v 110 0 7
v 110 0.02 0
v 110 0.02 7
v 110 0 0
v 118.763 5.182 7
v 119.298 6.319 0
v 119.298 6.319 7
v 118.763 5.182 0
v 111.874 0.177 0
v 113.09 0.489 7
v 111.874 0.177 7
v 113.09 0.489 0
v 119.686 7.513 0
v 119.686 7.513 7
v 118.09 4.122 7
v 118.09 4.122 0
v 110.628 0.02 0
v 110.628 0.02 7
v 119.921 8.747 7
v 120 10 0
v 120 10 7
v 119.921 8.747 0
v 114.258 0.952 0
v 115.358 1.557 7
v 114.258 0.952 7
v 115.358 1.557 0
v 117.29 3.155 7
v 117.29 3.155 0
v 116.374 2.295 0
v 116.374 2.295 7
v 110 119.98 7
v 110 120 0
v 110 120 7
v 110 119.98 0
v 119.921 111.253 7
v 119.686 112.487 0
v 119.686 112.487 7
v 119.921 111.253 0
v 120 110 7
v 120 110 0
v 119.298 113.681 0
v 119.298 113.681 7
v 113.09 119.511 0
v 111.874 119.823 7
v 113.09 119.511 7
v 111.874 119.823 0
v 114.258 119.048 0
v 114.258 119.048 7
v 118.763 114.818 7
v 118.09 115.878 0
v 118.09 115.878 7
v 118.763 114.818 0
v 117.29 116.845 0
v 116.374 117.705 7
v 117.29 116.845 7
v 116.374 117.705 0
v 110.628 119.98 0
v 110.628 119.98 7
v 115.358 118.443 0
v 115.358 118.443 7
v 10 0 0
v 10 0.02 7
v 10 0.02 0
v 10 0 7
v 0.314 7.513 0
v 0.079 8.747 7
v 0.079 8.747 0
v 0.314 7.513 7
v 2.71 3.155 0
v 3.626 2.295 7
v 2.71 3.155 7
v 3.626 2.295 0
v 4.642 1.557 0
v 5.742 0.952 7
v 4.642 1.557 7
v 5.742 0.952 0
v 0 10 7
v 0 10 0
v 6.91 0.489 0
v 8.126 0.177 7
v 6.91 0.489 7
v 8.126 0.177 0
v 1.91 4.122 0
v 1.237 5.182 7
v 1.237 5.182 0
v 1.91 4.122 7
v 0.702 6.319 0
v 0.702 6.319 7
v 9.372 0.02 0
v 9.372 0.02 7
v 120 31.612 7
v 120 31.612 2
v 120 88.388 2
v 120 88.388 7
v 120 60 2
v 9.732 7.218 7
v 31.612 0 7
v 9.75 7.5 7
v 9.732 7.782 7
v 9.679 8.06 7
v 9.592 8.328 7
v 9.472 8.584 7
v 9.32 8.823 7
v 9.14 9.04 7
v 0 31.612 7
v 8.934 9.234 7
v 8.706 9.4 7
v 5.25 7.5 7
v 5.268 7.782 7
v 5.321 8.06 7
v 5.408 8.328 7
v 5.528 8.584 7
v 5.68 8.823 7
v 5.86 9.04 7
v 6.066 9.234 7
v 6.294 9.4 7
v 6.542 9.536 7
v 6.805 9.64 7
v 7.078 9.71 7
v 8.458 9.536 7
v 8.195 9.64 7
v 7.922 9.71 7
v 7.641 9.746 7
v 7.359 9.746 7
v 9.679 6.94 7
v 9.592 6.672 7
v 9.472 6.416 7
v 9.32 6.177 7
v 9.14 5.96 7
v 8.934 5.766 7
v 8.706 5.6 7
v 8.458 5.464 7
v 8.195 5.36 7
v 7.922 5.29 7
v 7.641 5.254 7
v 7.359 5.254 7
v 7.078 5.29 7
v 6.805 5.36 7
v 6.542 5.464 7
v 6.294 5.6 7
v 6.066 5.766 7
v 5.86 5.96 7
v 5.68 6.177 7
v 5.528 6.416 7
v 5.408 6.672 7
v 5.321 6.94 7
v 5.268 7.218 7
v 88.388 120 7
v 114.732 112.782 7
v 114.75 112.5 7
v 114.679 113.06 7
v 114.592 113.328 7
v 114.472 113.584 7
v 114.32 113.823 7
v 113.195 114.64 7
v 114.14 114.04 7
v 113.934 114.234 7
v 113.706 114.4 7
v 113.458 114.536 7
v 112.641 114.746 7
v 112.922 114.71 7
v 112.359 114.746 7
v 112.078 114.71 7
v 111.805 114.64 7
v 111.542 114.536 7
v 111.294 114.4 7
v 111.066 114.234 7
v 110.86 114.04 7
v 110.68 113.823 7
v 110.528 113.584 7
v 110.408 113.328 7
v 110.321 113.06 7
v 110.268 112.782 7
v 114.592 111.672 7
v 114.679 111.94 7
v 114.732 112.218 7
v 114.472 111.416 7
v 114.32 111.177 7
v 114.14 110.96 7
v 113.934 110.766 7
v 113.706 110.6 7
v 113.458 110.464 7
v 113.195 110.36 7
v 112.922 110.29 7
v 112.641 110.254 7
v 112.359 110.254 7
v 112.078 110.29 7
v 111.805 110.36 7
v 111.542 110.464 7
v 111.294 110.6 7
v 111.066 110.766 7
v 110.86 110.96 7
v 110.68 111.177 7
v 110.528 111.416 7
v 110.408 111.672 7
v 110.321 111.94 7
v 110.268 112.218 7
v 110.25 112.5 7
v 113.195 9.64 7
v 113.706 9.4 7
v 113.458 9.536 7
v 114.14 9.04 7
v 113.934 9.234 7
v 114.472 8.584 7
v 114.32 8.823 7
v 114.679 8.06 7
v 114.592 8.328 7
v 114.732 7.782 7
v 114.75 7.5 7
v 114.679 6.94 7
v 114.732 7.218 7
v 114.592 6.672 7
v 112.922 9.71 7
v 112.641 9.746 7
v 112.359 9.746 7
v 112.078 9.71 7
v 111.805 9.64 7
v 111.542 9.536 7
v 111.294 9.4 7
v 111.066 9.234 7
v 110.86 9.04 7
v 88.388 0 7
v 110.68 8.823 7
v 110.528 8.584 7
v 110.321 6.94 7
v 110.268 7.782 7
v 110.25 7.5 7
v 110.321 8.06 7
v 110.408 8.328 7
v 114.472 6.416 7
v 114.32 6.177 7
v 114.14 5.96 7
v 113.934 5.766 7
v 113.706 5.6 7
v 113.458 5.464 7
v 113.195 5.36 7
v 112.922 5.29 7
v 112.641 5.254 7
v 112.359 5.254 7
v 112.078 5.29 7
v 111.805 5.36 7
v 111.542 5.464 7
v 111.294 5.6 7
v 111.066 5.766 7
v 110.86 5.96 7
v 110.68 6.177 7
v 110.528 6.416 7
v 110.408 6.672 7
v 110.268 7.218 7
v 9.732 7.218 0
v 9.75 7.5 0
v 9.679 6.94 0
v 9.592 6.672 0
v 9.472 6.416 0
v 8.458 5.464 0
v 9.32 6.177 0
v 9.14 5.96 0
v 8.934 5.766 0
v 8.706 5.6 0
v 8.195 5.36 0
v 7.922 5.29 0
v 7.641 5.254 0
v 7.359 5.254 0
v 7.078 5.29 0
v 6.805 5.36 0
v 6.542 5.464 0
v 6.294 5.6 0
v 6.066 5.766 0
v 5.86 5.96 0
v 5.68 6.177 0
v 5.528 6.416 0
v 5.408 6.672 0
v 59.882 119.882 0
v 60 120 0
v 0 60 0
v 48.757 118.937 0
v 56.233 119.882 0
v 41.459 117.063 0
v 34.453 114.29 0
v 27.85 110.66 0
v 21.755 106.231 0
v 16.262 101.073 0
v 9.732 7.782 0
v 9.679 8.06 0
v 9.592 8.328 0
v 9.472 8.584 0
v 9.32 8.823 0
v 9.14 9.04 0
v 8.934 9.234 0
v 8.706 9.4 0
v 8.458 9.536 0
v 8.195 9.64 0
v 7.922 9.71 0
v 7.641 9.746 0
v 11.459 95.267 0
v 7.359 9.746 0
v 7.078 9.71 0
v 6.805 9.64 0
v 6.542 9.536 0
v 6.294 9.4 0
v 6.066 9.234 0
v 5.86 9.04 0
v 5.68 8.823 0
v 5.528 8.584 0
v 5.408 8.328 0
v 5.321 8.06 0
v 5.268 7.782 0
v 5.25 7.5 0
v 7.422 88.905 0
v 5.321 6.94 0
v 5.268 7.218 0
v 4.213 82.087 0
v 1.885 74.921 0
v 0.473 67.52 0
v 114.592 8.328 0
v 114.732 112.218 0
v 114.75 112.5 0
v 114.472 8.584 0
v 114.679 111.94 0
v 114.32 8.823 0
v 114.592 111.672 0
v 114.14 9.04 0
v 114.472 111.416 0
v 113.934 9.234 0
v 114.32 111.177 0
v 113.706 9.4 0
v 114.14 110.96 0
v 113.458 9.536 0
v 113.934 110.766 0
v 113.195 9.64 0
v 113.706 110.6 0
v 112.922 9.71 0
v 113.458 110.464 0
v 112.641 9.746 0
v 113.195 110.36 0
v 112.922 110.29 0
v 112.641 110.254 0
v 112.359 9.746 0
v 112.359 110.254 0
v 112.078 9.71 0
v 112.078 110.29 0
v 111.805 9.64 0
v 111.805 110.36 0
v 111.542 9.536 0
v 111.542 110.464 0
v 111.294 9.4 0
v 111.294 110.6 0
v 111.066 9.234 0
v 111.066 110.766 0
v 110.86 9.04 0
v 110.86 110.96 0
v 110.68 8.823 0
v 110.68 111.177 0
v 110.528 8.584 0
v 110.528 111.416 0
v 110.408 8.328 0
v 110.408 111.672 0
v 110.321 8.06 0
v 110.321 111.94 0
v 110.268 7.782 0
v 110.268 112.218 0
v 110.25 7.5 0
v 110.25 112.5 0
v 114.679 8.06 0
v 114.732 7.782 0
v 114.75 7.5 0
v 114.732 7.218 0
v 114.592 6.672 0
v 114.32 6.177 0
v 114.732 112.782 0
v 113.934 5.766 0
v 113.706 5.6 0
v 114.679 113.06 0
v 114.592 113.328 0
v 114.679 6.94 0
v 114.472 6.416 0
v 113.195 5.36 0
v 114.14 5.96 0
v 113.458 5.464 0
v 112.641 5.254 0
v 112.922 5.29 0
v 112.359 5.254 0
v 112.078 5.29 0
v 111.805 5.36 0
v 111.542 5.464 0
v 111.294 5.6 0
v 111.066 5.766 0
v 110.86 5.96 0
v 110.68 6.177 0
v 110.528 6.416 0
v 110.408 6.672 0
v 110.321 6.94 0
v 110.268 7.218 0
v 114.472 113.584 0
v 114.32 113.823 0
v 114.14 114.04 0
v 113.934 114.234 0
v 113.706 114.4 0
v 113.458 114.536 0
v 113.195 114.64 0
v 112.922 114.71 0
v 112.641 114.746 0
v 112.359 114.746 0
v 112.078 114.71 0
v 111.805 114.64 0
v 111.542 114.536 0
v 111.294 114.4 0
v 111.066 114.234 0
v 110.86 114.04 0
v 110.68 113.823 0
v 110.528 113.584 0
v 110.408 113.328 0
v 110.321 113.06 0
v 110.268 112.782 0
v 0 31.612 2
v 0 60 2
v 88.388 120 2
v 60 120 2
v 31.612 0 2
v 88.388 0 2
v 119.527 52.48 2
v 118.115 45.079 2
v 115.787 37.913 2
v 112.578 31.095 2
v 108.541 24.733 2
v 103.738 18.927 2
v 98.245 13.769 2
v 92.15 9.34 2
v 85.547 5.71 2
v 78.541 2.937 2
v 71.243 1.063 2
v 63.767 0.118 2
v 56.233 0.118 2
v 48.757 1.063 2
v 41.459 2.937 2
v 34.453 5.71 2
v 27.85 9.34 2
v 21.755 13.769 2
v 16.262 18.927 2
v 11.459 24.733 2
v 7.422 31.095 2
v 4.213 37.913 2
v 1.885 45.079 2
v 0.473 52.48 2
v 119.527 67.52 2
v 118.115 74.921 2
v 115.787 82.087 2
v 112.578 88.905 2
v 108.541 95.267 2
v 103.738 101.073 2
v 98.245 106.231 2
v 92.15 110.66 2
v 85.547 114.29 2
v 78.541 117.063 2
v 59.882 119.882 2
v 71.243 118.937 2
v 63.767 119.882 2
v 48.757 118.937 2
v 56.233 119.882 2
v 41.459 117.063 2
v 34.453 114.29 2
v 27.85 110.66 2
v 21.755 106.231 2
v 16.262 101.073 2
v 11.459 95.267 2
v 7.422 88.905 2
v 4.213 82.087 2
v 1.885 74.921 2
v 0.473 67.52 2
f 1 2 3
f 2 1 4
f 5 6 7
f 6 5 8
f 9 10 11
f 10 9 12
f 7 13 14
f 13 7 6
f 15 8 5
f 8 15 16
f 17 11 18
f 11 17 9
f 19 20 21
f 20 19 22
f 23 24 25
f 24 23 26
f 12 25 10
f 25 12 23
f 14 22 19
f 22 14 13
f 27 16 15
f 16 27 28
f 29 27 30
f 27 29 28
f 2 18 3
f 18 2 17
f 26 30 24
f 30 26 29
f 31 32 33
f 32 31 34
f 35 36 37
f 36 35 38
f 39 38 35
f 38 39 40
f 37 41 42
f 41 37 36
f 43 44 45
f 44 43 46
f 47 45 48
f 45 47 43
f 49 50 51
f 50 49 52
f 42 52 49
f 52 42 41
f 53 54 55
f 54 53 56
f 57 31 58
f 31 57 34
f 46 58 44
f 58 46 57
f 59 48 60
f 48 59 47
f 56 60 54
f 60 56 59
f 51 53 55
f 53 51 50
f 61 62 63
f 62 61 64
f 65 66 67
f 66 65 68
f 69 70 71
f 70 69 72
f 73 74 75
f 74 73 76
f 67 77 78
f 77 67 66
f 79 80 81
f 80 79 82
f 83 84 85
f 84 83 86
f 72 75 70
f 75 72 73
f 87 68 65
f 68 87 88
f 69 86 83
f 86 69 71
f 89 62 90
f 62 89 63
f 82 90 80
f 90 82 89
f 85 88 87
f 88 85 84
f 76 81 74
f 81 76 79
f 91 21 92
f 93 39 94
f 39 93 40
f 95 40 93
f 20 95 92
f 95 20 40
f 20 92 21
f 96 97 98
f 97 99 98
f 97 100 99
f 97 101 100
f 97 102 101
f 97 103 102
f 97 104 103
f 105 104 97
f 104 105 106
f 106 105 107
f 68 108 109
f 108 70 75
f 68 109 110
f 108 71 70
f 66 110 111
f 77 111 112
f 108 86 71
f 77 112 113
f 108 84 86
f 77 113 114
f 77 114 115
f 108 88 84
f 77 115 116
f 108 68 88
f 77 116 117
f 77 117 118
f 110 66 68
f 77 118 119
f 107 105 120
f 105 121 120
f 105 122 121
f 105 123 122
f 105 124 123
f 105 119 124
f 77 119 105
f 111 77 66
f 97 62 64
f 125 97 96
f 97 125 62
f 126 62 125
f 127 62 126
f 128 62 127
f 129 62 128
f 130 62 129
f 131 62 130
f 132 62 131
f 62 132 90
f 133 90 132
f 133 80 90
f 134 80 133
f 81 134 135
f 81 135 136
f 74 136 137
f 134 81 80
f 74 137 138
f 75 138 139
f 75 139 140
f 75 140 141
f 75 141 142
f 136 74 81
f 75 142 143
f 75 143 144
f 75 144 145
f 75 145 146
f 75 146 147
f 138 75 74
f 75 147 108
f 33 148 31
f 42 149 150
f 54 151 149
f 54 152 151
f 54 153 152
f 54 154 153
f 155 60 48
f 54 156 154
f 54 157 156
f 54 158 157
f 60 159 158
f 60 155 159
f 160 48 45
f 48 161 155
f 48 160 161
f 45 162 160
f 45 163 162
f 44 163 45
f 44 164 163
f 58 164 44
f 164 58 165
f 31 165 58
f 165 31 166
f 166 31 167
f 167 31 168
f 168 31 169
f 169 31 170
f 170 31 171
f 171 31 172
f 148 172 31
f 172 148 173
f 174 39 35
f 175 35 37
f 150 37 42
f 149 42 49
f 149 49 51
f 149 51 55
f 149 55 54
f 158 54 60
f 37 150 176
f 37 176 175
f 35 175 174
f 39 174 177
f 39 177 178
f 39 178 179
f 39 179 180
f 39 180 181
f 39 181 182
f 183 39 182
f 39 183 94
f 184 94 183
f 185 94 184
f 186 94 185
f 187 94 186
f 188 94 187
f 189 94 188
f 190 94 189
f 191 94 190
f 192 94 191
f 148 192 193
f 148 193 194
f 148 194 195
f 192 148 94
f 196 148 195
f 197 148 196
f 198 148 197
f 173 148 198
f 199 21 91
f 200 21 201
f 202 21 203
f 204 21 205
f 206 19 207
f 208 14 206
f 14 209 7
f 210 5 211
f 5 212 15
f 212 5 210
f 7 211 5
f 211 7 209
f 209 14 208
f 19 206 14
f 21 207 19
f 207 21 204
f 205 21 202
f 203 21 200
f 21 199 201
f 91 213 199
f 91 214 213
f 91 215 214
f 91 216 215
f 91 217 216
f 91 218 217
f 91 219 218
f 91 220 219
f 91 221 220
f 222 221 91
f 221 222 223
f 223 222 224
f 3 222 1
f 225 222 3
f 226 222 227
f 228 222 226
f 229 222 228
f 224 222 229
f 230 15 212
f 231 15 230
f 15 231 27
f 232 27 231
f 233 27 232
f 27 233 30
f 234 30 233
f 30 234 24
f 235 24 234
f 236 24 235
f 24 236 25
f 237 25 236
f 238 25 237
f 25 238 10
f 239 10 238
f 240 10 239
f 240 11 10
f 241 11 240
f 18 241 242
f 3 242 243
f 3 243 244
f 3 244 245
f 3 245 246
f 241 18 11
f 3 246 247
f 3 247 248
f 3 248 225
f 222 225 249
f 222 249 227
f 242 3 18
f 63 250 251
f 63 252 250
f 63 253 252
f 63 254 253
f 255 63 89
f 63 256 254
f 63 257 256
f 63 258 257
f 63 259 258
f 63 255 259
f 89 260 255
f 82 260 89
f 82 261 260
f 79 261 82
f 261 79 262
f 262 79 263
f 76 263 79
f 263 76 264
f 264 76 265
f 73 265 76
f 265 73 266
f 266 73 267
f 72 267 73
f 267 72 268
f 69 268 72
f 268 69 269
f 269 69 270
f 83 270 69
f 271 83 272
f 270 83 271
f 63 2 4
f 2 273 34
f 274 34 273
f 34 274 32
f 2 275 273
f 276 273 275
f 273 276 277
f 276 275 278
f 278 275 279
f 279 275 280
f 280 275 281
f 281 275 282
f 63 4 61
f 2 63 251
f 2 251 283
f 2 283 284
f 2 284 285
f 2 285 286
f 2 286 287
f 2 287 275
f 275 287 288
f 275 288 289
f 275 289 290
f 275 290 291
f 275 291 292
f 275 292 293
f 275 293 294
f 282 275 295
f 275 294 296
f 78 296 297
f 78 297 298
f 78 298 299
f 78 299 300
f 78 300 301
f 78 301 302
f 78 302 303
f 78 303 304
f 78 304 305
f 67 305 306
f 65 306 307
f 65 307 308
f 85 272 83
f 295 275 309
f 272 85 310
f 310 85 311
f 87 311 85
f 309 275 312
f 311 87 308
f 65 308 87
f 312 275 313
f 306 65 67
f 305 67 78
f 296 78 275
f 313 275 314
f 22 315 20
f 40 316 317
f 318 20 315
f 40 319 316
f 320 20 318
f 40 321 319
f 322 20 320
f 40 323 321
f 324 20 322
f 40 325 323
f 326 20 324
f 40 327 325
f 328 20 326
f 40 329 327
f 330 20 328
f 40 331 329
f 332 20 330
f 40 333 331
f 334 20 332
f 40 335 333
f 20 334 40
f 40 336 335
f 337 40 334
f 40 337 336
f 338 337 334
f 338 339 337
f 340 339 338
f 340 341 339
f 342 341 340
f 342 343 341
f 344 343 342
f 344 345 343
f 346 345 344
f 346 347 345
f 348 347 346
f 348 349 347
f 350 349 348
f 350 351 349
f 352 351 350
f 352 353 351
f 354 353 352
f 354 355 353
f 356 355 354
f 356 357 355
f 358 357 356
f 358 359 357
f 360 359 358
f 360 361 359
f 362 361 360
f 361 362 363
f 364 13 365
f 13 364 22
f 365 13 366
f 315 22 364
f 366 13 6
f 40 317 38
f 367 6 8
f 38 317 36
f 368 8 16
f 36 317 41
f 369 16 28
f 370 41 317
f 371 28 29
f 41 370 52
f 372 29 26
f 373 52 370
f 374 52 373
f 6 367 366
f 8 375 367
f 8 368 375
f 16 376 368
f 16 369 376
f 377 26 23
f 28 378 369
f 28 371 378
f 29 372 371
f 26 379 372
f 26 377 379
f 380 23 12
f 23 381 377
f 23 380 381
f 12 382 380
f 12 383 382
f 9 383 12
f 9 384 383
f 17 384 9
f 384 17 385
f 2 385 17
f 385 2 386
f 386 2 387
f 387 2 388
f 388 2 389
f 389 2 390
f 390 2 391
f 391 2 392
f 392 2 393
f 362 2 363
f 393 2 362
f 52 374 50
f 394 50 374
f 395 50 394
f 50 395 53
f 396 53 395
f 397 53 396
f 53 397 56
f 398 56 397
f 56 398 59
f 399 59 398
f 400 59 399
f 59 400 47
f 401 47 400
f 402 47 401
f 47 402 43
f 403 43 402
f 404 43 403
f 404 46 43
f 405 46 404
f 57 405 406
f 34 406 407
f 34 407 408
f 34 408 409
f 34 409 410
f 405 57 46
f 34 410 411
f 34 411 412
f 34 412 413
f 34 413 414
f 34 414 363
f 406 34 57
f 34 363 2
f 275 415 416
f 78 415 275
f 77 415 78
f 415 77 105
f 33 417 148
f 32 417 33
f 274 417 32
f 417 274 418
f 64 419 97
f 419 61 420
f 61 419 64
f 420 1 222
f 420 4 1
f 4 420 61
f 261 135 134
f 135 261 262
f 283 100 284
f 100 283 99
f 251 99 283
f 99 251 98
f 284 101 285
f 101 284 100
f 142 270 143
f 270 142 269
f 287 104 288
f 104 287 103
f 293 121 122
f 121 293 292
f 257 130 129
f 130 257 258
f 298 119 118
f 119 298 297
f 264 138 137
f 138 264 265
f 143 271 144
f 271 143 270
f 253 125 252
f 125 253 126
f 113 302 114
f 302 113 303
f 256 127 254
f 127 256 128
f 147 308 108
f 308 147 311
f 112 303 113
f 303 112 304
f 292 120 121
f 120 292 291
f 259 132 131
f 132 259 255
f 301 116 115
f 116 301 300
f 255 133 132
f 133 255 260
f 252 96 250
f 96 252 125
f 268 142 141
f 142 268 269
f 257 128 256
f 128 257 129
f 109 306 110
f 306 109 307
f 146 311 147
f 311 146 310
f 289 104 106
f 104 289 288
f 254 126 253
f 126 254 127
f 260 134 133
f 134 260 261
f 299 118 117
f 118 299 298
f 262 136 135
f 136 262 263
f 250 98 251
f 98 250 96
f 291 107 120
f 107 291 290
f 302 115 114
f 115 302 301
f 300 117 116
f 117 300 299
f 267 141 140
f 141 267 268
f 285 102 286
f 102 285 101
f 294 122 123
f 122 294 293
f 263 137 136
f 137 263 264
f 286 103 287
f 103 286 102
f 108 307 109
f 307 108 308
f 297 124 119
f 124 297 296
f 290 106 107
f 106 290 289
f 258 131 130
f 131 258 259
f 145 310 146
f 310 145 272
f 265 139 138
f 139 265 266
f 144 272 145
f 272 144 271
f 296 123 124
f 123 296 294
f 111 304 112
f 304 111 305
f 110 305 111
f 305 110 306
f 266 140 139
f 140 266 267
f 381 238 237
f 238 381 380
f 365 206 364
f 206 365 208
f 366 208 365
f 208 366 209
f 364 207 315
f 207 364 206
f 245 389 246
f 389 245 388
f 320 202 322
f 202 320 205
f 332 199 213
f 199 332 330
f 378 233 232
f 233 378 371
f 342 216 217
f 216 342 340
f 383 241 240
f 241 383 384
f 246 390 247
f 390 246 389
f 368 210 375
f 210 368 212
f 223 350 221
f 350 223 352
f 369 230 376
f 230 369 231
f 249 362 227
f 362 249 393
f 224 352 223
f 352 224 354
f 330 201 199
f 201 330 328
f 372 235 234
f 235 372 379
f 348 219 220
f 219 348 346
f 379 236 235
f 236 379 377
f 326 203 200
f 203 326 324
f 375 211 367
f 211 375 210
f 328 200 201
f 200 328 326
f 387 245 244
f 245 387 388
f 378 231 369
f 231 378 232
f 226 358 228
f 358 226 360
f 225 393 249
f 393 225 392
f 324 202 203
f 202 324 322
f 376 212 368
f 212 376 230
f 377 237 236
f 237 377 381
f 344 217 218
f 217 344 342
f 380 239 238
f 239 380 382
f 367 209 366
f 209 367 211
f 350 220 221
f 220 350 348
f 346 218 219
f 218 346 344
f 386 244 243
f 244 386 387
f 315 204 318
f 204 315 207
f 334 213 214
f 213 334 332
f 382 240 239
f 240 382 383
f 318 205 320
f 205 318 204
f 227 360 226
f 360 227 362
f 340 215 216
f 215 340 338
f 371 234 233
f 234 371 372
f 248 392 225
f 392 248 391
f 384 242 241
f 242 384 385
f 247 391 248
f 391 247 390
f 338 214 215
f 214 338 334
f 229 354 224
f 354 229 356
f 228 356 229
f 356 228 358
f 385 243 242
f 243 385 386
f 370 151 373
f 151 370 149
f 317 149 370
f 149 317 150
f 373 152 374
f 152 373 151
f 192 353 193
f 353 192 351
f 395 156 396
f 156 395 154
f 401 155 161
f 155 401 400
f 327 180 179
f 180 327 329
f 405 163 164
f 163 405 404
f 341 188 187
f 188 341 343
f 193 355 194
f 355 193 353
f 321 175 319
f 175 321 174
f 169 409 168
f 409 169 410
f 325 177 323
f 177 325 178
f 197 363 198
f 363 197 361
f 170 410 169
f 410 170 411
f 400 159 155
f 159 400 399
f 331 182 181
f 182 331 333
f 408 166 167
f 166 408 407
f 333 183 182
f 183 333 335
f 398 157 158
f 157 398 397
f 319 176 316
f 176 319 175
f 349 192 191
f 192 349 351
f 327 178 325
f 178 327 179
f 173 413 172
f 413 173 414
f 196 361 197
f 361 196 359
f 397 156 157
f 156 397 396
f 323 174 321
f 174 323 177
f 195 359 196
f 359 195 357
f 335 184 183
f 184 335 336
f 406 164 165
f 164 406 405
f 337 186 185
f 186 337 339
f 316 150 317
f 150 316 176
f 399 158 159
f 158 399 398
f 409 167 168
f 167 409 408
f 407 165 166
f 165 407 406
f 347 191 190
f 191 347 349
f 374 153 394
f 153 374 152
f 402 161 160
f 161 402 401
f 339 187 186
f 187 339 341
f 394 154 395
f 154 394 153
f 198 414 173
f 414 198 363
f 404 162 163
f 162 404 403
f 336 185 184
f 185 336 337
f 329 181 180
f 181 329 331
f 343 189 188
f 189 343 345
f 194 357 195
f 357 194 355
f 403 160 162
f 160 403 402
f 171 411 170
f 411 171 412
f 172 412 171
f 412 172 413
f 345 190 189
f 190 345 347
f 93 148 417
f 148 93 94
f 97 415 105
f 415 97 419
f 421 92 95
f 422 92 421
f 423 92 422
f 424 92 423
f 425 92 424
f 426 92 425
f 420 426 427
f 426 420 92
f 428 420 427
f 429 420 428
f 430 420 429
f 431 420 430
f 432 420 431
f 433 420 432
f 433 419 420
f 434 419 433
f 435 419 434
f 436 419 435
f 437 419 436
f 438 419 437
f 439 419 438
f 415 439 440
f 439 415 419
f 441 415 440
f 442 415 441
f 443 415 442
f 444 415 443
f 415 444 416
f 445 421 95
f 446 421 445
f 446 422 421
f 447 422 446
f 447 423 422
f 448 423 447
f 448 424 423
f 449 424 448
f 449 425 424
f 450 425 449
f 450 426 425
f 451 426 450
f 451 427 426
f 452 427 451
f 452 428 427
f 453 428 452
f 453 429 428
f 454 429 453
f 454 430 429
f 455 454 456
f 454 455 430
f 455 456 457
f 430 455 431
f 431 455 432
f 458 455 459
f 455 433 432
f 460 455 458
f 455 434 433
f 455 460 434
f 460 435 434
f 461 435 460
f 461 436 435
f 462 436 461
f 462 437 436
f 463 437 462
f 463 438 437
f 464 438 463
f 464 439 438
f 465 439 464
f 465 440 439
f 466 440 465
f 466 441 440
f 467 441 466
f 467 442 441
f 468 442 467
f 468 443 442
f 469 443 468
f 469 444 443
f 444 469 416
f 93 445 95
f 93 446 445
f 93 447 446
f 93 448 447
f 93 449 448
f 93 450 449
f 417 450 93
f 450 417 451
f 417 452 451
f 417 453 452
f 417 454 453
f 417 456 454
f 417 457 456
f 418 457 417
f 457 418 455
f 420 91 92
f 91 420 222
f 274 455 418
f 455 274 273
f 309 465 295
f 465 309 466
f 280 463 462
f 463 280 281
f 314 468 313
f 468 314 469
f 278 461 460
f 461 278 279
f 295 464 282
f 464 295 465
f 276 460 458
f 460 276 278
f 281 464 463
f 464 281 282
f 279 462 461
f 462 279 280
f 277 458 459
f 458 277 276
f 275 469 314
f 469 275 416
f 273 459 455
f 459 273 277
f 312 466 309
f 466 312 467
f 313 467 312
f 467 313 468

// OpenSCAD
//Fan Size
size = 120;
//Distance between fan mounting holes
hole_spacing = 105;
//Rounded corner radius
corner_radius = 10;
//Thickness of outside plate
thickness = 2;
//Should match the thickness of the filter
stand_off_length = 5;
//Mounting hole size
screw_size = 4.5;


$filtersize=size+5;
$c = sqrt($filtersize*$filtersize*2);
$standoffwidth = screw_size+6;
$screwoffset = (size-hole_spacing)/2;
difference(){
    union(){
        cube([size,size,thickness+stand_off_length]);
    }
    translate([$screwoffset,$screwoffset,-1])
    cylinder(thickness+stand_off_length+2,screw_size/2,screw_size/2,$fn=50);
    translate([$screwoffset+hole_spacing,$screwoffset,-1])
    cylinder(thickness+stand_off_length+2,screw_size/2,screw_size/2,$fn=50);
    translate([$screwoffset,$screwoffset+hole_spacing,-1])
    cylinder(thickness+stand_off_length+2,screw_size/2,screw_size/2,$fn=50);
    translate([$screwoffset+hole_spacing,$screwoffset+hole_spacing,-1])
    cylinder(thickness+stand_off_length+2,screw_size/2,screw_size/2,$fn=50);
    translate([size/2,-1*($c-size)/2,thickness])
    rotate([0,0,45])
    cube([$filtersize,$filtersize*2,thickness+stand_off_length]);
    translate([0,size*.5,-1])
    rotate([0,0,45])
    cube([size,size,thickness+stand_off_length+2]);
    
    translate ([size,0,0])
	translate ([-corner_radius,corner_radius,-1])
	difference () {
		translate ([0,-corner_radius*2,0])
		cube ([corner_radius*2,corner_radius*2,thickness+stand_off_length+2]);
		cylinder (r=corner_radius,h=thickness+stand_off_length+2,$fn=50);
	}
    
    translate ([size,size,0])
	translate ([-corner_radius,-corner_radius,-1])
	difference () {
		cube ([corner_radius*2,corner_radius*2,thickness+stand_off_length+2]);
		cylinder (r=corner_radius,h=thickness+stand_off_length+2,$fn=50);
	}
    	translate ([corner_radius,corner_radius,-1])
	difference () {
		translate ([-corner_radius*2,-corner_radius*2,0])
		cube ([corner_radius*2,corner_radius*2,thickness+stand_off_length+2]);
		cylinder (r=corner_radius,h=thickness+stand_off_length+2,$fn=50);
	}

    
}
translate([size/2,size/2,0])
cylinder(thickness,size/2,size/2,$fn=50);
